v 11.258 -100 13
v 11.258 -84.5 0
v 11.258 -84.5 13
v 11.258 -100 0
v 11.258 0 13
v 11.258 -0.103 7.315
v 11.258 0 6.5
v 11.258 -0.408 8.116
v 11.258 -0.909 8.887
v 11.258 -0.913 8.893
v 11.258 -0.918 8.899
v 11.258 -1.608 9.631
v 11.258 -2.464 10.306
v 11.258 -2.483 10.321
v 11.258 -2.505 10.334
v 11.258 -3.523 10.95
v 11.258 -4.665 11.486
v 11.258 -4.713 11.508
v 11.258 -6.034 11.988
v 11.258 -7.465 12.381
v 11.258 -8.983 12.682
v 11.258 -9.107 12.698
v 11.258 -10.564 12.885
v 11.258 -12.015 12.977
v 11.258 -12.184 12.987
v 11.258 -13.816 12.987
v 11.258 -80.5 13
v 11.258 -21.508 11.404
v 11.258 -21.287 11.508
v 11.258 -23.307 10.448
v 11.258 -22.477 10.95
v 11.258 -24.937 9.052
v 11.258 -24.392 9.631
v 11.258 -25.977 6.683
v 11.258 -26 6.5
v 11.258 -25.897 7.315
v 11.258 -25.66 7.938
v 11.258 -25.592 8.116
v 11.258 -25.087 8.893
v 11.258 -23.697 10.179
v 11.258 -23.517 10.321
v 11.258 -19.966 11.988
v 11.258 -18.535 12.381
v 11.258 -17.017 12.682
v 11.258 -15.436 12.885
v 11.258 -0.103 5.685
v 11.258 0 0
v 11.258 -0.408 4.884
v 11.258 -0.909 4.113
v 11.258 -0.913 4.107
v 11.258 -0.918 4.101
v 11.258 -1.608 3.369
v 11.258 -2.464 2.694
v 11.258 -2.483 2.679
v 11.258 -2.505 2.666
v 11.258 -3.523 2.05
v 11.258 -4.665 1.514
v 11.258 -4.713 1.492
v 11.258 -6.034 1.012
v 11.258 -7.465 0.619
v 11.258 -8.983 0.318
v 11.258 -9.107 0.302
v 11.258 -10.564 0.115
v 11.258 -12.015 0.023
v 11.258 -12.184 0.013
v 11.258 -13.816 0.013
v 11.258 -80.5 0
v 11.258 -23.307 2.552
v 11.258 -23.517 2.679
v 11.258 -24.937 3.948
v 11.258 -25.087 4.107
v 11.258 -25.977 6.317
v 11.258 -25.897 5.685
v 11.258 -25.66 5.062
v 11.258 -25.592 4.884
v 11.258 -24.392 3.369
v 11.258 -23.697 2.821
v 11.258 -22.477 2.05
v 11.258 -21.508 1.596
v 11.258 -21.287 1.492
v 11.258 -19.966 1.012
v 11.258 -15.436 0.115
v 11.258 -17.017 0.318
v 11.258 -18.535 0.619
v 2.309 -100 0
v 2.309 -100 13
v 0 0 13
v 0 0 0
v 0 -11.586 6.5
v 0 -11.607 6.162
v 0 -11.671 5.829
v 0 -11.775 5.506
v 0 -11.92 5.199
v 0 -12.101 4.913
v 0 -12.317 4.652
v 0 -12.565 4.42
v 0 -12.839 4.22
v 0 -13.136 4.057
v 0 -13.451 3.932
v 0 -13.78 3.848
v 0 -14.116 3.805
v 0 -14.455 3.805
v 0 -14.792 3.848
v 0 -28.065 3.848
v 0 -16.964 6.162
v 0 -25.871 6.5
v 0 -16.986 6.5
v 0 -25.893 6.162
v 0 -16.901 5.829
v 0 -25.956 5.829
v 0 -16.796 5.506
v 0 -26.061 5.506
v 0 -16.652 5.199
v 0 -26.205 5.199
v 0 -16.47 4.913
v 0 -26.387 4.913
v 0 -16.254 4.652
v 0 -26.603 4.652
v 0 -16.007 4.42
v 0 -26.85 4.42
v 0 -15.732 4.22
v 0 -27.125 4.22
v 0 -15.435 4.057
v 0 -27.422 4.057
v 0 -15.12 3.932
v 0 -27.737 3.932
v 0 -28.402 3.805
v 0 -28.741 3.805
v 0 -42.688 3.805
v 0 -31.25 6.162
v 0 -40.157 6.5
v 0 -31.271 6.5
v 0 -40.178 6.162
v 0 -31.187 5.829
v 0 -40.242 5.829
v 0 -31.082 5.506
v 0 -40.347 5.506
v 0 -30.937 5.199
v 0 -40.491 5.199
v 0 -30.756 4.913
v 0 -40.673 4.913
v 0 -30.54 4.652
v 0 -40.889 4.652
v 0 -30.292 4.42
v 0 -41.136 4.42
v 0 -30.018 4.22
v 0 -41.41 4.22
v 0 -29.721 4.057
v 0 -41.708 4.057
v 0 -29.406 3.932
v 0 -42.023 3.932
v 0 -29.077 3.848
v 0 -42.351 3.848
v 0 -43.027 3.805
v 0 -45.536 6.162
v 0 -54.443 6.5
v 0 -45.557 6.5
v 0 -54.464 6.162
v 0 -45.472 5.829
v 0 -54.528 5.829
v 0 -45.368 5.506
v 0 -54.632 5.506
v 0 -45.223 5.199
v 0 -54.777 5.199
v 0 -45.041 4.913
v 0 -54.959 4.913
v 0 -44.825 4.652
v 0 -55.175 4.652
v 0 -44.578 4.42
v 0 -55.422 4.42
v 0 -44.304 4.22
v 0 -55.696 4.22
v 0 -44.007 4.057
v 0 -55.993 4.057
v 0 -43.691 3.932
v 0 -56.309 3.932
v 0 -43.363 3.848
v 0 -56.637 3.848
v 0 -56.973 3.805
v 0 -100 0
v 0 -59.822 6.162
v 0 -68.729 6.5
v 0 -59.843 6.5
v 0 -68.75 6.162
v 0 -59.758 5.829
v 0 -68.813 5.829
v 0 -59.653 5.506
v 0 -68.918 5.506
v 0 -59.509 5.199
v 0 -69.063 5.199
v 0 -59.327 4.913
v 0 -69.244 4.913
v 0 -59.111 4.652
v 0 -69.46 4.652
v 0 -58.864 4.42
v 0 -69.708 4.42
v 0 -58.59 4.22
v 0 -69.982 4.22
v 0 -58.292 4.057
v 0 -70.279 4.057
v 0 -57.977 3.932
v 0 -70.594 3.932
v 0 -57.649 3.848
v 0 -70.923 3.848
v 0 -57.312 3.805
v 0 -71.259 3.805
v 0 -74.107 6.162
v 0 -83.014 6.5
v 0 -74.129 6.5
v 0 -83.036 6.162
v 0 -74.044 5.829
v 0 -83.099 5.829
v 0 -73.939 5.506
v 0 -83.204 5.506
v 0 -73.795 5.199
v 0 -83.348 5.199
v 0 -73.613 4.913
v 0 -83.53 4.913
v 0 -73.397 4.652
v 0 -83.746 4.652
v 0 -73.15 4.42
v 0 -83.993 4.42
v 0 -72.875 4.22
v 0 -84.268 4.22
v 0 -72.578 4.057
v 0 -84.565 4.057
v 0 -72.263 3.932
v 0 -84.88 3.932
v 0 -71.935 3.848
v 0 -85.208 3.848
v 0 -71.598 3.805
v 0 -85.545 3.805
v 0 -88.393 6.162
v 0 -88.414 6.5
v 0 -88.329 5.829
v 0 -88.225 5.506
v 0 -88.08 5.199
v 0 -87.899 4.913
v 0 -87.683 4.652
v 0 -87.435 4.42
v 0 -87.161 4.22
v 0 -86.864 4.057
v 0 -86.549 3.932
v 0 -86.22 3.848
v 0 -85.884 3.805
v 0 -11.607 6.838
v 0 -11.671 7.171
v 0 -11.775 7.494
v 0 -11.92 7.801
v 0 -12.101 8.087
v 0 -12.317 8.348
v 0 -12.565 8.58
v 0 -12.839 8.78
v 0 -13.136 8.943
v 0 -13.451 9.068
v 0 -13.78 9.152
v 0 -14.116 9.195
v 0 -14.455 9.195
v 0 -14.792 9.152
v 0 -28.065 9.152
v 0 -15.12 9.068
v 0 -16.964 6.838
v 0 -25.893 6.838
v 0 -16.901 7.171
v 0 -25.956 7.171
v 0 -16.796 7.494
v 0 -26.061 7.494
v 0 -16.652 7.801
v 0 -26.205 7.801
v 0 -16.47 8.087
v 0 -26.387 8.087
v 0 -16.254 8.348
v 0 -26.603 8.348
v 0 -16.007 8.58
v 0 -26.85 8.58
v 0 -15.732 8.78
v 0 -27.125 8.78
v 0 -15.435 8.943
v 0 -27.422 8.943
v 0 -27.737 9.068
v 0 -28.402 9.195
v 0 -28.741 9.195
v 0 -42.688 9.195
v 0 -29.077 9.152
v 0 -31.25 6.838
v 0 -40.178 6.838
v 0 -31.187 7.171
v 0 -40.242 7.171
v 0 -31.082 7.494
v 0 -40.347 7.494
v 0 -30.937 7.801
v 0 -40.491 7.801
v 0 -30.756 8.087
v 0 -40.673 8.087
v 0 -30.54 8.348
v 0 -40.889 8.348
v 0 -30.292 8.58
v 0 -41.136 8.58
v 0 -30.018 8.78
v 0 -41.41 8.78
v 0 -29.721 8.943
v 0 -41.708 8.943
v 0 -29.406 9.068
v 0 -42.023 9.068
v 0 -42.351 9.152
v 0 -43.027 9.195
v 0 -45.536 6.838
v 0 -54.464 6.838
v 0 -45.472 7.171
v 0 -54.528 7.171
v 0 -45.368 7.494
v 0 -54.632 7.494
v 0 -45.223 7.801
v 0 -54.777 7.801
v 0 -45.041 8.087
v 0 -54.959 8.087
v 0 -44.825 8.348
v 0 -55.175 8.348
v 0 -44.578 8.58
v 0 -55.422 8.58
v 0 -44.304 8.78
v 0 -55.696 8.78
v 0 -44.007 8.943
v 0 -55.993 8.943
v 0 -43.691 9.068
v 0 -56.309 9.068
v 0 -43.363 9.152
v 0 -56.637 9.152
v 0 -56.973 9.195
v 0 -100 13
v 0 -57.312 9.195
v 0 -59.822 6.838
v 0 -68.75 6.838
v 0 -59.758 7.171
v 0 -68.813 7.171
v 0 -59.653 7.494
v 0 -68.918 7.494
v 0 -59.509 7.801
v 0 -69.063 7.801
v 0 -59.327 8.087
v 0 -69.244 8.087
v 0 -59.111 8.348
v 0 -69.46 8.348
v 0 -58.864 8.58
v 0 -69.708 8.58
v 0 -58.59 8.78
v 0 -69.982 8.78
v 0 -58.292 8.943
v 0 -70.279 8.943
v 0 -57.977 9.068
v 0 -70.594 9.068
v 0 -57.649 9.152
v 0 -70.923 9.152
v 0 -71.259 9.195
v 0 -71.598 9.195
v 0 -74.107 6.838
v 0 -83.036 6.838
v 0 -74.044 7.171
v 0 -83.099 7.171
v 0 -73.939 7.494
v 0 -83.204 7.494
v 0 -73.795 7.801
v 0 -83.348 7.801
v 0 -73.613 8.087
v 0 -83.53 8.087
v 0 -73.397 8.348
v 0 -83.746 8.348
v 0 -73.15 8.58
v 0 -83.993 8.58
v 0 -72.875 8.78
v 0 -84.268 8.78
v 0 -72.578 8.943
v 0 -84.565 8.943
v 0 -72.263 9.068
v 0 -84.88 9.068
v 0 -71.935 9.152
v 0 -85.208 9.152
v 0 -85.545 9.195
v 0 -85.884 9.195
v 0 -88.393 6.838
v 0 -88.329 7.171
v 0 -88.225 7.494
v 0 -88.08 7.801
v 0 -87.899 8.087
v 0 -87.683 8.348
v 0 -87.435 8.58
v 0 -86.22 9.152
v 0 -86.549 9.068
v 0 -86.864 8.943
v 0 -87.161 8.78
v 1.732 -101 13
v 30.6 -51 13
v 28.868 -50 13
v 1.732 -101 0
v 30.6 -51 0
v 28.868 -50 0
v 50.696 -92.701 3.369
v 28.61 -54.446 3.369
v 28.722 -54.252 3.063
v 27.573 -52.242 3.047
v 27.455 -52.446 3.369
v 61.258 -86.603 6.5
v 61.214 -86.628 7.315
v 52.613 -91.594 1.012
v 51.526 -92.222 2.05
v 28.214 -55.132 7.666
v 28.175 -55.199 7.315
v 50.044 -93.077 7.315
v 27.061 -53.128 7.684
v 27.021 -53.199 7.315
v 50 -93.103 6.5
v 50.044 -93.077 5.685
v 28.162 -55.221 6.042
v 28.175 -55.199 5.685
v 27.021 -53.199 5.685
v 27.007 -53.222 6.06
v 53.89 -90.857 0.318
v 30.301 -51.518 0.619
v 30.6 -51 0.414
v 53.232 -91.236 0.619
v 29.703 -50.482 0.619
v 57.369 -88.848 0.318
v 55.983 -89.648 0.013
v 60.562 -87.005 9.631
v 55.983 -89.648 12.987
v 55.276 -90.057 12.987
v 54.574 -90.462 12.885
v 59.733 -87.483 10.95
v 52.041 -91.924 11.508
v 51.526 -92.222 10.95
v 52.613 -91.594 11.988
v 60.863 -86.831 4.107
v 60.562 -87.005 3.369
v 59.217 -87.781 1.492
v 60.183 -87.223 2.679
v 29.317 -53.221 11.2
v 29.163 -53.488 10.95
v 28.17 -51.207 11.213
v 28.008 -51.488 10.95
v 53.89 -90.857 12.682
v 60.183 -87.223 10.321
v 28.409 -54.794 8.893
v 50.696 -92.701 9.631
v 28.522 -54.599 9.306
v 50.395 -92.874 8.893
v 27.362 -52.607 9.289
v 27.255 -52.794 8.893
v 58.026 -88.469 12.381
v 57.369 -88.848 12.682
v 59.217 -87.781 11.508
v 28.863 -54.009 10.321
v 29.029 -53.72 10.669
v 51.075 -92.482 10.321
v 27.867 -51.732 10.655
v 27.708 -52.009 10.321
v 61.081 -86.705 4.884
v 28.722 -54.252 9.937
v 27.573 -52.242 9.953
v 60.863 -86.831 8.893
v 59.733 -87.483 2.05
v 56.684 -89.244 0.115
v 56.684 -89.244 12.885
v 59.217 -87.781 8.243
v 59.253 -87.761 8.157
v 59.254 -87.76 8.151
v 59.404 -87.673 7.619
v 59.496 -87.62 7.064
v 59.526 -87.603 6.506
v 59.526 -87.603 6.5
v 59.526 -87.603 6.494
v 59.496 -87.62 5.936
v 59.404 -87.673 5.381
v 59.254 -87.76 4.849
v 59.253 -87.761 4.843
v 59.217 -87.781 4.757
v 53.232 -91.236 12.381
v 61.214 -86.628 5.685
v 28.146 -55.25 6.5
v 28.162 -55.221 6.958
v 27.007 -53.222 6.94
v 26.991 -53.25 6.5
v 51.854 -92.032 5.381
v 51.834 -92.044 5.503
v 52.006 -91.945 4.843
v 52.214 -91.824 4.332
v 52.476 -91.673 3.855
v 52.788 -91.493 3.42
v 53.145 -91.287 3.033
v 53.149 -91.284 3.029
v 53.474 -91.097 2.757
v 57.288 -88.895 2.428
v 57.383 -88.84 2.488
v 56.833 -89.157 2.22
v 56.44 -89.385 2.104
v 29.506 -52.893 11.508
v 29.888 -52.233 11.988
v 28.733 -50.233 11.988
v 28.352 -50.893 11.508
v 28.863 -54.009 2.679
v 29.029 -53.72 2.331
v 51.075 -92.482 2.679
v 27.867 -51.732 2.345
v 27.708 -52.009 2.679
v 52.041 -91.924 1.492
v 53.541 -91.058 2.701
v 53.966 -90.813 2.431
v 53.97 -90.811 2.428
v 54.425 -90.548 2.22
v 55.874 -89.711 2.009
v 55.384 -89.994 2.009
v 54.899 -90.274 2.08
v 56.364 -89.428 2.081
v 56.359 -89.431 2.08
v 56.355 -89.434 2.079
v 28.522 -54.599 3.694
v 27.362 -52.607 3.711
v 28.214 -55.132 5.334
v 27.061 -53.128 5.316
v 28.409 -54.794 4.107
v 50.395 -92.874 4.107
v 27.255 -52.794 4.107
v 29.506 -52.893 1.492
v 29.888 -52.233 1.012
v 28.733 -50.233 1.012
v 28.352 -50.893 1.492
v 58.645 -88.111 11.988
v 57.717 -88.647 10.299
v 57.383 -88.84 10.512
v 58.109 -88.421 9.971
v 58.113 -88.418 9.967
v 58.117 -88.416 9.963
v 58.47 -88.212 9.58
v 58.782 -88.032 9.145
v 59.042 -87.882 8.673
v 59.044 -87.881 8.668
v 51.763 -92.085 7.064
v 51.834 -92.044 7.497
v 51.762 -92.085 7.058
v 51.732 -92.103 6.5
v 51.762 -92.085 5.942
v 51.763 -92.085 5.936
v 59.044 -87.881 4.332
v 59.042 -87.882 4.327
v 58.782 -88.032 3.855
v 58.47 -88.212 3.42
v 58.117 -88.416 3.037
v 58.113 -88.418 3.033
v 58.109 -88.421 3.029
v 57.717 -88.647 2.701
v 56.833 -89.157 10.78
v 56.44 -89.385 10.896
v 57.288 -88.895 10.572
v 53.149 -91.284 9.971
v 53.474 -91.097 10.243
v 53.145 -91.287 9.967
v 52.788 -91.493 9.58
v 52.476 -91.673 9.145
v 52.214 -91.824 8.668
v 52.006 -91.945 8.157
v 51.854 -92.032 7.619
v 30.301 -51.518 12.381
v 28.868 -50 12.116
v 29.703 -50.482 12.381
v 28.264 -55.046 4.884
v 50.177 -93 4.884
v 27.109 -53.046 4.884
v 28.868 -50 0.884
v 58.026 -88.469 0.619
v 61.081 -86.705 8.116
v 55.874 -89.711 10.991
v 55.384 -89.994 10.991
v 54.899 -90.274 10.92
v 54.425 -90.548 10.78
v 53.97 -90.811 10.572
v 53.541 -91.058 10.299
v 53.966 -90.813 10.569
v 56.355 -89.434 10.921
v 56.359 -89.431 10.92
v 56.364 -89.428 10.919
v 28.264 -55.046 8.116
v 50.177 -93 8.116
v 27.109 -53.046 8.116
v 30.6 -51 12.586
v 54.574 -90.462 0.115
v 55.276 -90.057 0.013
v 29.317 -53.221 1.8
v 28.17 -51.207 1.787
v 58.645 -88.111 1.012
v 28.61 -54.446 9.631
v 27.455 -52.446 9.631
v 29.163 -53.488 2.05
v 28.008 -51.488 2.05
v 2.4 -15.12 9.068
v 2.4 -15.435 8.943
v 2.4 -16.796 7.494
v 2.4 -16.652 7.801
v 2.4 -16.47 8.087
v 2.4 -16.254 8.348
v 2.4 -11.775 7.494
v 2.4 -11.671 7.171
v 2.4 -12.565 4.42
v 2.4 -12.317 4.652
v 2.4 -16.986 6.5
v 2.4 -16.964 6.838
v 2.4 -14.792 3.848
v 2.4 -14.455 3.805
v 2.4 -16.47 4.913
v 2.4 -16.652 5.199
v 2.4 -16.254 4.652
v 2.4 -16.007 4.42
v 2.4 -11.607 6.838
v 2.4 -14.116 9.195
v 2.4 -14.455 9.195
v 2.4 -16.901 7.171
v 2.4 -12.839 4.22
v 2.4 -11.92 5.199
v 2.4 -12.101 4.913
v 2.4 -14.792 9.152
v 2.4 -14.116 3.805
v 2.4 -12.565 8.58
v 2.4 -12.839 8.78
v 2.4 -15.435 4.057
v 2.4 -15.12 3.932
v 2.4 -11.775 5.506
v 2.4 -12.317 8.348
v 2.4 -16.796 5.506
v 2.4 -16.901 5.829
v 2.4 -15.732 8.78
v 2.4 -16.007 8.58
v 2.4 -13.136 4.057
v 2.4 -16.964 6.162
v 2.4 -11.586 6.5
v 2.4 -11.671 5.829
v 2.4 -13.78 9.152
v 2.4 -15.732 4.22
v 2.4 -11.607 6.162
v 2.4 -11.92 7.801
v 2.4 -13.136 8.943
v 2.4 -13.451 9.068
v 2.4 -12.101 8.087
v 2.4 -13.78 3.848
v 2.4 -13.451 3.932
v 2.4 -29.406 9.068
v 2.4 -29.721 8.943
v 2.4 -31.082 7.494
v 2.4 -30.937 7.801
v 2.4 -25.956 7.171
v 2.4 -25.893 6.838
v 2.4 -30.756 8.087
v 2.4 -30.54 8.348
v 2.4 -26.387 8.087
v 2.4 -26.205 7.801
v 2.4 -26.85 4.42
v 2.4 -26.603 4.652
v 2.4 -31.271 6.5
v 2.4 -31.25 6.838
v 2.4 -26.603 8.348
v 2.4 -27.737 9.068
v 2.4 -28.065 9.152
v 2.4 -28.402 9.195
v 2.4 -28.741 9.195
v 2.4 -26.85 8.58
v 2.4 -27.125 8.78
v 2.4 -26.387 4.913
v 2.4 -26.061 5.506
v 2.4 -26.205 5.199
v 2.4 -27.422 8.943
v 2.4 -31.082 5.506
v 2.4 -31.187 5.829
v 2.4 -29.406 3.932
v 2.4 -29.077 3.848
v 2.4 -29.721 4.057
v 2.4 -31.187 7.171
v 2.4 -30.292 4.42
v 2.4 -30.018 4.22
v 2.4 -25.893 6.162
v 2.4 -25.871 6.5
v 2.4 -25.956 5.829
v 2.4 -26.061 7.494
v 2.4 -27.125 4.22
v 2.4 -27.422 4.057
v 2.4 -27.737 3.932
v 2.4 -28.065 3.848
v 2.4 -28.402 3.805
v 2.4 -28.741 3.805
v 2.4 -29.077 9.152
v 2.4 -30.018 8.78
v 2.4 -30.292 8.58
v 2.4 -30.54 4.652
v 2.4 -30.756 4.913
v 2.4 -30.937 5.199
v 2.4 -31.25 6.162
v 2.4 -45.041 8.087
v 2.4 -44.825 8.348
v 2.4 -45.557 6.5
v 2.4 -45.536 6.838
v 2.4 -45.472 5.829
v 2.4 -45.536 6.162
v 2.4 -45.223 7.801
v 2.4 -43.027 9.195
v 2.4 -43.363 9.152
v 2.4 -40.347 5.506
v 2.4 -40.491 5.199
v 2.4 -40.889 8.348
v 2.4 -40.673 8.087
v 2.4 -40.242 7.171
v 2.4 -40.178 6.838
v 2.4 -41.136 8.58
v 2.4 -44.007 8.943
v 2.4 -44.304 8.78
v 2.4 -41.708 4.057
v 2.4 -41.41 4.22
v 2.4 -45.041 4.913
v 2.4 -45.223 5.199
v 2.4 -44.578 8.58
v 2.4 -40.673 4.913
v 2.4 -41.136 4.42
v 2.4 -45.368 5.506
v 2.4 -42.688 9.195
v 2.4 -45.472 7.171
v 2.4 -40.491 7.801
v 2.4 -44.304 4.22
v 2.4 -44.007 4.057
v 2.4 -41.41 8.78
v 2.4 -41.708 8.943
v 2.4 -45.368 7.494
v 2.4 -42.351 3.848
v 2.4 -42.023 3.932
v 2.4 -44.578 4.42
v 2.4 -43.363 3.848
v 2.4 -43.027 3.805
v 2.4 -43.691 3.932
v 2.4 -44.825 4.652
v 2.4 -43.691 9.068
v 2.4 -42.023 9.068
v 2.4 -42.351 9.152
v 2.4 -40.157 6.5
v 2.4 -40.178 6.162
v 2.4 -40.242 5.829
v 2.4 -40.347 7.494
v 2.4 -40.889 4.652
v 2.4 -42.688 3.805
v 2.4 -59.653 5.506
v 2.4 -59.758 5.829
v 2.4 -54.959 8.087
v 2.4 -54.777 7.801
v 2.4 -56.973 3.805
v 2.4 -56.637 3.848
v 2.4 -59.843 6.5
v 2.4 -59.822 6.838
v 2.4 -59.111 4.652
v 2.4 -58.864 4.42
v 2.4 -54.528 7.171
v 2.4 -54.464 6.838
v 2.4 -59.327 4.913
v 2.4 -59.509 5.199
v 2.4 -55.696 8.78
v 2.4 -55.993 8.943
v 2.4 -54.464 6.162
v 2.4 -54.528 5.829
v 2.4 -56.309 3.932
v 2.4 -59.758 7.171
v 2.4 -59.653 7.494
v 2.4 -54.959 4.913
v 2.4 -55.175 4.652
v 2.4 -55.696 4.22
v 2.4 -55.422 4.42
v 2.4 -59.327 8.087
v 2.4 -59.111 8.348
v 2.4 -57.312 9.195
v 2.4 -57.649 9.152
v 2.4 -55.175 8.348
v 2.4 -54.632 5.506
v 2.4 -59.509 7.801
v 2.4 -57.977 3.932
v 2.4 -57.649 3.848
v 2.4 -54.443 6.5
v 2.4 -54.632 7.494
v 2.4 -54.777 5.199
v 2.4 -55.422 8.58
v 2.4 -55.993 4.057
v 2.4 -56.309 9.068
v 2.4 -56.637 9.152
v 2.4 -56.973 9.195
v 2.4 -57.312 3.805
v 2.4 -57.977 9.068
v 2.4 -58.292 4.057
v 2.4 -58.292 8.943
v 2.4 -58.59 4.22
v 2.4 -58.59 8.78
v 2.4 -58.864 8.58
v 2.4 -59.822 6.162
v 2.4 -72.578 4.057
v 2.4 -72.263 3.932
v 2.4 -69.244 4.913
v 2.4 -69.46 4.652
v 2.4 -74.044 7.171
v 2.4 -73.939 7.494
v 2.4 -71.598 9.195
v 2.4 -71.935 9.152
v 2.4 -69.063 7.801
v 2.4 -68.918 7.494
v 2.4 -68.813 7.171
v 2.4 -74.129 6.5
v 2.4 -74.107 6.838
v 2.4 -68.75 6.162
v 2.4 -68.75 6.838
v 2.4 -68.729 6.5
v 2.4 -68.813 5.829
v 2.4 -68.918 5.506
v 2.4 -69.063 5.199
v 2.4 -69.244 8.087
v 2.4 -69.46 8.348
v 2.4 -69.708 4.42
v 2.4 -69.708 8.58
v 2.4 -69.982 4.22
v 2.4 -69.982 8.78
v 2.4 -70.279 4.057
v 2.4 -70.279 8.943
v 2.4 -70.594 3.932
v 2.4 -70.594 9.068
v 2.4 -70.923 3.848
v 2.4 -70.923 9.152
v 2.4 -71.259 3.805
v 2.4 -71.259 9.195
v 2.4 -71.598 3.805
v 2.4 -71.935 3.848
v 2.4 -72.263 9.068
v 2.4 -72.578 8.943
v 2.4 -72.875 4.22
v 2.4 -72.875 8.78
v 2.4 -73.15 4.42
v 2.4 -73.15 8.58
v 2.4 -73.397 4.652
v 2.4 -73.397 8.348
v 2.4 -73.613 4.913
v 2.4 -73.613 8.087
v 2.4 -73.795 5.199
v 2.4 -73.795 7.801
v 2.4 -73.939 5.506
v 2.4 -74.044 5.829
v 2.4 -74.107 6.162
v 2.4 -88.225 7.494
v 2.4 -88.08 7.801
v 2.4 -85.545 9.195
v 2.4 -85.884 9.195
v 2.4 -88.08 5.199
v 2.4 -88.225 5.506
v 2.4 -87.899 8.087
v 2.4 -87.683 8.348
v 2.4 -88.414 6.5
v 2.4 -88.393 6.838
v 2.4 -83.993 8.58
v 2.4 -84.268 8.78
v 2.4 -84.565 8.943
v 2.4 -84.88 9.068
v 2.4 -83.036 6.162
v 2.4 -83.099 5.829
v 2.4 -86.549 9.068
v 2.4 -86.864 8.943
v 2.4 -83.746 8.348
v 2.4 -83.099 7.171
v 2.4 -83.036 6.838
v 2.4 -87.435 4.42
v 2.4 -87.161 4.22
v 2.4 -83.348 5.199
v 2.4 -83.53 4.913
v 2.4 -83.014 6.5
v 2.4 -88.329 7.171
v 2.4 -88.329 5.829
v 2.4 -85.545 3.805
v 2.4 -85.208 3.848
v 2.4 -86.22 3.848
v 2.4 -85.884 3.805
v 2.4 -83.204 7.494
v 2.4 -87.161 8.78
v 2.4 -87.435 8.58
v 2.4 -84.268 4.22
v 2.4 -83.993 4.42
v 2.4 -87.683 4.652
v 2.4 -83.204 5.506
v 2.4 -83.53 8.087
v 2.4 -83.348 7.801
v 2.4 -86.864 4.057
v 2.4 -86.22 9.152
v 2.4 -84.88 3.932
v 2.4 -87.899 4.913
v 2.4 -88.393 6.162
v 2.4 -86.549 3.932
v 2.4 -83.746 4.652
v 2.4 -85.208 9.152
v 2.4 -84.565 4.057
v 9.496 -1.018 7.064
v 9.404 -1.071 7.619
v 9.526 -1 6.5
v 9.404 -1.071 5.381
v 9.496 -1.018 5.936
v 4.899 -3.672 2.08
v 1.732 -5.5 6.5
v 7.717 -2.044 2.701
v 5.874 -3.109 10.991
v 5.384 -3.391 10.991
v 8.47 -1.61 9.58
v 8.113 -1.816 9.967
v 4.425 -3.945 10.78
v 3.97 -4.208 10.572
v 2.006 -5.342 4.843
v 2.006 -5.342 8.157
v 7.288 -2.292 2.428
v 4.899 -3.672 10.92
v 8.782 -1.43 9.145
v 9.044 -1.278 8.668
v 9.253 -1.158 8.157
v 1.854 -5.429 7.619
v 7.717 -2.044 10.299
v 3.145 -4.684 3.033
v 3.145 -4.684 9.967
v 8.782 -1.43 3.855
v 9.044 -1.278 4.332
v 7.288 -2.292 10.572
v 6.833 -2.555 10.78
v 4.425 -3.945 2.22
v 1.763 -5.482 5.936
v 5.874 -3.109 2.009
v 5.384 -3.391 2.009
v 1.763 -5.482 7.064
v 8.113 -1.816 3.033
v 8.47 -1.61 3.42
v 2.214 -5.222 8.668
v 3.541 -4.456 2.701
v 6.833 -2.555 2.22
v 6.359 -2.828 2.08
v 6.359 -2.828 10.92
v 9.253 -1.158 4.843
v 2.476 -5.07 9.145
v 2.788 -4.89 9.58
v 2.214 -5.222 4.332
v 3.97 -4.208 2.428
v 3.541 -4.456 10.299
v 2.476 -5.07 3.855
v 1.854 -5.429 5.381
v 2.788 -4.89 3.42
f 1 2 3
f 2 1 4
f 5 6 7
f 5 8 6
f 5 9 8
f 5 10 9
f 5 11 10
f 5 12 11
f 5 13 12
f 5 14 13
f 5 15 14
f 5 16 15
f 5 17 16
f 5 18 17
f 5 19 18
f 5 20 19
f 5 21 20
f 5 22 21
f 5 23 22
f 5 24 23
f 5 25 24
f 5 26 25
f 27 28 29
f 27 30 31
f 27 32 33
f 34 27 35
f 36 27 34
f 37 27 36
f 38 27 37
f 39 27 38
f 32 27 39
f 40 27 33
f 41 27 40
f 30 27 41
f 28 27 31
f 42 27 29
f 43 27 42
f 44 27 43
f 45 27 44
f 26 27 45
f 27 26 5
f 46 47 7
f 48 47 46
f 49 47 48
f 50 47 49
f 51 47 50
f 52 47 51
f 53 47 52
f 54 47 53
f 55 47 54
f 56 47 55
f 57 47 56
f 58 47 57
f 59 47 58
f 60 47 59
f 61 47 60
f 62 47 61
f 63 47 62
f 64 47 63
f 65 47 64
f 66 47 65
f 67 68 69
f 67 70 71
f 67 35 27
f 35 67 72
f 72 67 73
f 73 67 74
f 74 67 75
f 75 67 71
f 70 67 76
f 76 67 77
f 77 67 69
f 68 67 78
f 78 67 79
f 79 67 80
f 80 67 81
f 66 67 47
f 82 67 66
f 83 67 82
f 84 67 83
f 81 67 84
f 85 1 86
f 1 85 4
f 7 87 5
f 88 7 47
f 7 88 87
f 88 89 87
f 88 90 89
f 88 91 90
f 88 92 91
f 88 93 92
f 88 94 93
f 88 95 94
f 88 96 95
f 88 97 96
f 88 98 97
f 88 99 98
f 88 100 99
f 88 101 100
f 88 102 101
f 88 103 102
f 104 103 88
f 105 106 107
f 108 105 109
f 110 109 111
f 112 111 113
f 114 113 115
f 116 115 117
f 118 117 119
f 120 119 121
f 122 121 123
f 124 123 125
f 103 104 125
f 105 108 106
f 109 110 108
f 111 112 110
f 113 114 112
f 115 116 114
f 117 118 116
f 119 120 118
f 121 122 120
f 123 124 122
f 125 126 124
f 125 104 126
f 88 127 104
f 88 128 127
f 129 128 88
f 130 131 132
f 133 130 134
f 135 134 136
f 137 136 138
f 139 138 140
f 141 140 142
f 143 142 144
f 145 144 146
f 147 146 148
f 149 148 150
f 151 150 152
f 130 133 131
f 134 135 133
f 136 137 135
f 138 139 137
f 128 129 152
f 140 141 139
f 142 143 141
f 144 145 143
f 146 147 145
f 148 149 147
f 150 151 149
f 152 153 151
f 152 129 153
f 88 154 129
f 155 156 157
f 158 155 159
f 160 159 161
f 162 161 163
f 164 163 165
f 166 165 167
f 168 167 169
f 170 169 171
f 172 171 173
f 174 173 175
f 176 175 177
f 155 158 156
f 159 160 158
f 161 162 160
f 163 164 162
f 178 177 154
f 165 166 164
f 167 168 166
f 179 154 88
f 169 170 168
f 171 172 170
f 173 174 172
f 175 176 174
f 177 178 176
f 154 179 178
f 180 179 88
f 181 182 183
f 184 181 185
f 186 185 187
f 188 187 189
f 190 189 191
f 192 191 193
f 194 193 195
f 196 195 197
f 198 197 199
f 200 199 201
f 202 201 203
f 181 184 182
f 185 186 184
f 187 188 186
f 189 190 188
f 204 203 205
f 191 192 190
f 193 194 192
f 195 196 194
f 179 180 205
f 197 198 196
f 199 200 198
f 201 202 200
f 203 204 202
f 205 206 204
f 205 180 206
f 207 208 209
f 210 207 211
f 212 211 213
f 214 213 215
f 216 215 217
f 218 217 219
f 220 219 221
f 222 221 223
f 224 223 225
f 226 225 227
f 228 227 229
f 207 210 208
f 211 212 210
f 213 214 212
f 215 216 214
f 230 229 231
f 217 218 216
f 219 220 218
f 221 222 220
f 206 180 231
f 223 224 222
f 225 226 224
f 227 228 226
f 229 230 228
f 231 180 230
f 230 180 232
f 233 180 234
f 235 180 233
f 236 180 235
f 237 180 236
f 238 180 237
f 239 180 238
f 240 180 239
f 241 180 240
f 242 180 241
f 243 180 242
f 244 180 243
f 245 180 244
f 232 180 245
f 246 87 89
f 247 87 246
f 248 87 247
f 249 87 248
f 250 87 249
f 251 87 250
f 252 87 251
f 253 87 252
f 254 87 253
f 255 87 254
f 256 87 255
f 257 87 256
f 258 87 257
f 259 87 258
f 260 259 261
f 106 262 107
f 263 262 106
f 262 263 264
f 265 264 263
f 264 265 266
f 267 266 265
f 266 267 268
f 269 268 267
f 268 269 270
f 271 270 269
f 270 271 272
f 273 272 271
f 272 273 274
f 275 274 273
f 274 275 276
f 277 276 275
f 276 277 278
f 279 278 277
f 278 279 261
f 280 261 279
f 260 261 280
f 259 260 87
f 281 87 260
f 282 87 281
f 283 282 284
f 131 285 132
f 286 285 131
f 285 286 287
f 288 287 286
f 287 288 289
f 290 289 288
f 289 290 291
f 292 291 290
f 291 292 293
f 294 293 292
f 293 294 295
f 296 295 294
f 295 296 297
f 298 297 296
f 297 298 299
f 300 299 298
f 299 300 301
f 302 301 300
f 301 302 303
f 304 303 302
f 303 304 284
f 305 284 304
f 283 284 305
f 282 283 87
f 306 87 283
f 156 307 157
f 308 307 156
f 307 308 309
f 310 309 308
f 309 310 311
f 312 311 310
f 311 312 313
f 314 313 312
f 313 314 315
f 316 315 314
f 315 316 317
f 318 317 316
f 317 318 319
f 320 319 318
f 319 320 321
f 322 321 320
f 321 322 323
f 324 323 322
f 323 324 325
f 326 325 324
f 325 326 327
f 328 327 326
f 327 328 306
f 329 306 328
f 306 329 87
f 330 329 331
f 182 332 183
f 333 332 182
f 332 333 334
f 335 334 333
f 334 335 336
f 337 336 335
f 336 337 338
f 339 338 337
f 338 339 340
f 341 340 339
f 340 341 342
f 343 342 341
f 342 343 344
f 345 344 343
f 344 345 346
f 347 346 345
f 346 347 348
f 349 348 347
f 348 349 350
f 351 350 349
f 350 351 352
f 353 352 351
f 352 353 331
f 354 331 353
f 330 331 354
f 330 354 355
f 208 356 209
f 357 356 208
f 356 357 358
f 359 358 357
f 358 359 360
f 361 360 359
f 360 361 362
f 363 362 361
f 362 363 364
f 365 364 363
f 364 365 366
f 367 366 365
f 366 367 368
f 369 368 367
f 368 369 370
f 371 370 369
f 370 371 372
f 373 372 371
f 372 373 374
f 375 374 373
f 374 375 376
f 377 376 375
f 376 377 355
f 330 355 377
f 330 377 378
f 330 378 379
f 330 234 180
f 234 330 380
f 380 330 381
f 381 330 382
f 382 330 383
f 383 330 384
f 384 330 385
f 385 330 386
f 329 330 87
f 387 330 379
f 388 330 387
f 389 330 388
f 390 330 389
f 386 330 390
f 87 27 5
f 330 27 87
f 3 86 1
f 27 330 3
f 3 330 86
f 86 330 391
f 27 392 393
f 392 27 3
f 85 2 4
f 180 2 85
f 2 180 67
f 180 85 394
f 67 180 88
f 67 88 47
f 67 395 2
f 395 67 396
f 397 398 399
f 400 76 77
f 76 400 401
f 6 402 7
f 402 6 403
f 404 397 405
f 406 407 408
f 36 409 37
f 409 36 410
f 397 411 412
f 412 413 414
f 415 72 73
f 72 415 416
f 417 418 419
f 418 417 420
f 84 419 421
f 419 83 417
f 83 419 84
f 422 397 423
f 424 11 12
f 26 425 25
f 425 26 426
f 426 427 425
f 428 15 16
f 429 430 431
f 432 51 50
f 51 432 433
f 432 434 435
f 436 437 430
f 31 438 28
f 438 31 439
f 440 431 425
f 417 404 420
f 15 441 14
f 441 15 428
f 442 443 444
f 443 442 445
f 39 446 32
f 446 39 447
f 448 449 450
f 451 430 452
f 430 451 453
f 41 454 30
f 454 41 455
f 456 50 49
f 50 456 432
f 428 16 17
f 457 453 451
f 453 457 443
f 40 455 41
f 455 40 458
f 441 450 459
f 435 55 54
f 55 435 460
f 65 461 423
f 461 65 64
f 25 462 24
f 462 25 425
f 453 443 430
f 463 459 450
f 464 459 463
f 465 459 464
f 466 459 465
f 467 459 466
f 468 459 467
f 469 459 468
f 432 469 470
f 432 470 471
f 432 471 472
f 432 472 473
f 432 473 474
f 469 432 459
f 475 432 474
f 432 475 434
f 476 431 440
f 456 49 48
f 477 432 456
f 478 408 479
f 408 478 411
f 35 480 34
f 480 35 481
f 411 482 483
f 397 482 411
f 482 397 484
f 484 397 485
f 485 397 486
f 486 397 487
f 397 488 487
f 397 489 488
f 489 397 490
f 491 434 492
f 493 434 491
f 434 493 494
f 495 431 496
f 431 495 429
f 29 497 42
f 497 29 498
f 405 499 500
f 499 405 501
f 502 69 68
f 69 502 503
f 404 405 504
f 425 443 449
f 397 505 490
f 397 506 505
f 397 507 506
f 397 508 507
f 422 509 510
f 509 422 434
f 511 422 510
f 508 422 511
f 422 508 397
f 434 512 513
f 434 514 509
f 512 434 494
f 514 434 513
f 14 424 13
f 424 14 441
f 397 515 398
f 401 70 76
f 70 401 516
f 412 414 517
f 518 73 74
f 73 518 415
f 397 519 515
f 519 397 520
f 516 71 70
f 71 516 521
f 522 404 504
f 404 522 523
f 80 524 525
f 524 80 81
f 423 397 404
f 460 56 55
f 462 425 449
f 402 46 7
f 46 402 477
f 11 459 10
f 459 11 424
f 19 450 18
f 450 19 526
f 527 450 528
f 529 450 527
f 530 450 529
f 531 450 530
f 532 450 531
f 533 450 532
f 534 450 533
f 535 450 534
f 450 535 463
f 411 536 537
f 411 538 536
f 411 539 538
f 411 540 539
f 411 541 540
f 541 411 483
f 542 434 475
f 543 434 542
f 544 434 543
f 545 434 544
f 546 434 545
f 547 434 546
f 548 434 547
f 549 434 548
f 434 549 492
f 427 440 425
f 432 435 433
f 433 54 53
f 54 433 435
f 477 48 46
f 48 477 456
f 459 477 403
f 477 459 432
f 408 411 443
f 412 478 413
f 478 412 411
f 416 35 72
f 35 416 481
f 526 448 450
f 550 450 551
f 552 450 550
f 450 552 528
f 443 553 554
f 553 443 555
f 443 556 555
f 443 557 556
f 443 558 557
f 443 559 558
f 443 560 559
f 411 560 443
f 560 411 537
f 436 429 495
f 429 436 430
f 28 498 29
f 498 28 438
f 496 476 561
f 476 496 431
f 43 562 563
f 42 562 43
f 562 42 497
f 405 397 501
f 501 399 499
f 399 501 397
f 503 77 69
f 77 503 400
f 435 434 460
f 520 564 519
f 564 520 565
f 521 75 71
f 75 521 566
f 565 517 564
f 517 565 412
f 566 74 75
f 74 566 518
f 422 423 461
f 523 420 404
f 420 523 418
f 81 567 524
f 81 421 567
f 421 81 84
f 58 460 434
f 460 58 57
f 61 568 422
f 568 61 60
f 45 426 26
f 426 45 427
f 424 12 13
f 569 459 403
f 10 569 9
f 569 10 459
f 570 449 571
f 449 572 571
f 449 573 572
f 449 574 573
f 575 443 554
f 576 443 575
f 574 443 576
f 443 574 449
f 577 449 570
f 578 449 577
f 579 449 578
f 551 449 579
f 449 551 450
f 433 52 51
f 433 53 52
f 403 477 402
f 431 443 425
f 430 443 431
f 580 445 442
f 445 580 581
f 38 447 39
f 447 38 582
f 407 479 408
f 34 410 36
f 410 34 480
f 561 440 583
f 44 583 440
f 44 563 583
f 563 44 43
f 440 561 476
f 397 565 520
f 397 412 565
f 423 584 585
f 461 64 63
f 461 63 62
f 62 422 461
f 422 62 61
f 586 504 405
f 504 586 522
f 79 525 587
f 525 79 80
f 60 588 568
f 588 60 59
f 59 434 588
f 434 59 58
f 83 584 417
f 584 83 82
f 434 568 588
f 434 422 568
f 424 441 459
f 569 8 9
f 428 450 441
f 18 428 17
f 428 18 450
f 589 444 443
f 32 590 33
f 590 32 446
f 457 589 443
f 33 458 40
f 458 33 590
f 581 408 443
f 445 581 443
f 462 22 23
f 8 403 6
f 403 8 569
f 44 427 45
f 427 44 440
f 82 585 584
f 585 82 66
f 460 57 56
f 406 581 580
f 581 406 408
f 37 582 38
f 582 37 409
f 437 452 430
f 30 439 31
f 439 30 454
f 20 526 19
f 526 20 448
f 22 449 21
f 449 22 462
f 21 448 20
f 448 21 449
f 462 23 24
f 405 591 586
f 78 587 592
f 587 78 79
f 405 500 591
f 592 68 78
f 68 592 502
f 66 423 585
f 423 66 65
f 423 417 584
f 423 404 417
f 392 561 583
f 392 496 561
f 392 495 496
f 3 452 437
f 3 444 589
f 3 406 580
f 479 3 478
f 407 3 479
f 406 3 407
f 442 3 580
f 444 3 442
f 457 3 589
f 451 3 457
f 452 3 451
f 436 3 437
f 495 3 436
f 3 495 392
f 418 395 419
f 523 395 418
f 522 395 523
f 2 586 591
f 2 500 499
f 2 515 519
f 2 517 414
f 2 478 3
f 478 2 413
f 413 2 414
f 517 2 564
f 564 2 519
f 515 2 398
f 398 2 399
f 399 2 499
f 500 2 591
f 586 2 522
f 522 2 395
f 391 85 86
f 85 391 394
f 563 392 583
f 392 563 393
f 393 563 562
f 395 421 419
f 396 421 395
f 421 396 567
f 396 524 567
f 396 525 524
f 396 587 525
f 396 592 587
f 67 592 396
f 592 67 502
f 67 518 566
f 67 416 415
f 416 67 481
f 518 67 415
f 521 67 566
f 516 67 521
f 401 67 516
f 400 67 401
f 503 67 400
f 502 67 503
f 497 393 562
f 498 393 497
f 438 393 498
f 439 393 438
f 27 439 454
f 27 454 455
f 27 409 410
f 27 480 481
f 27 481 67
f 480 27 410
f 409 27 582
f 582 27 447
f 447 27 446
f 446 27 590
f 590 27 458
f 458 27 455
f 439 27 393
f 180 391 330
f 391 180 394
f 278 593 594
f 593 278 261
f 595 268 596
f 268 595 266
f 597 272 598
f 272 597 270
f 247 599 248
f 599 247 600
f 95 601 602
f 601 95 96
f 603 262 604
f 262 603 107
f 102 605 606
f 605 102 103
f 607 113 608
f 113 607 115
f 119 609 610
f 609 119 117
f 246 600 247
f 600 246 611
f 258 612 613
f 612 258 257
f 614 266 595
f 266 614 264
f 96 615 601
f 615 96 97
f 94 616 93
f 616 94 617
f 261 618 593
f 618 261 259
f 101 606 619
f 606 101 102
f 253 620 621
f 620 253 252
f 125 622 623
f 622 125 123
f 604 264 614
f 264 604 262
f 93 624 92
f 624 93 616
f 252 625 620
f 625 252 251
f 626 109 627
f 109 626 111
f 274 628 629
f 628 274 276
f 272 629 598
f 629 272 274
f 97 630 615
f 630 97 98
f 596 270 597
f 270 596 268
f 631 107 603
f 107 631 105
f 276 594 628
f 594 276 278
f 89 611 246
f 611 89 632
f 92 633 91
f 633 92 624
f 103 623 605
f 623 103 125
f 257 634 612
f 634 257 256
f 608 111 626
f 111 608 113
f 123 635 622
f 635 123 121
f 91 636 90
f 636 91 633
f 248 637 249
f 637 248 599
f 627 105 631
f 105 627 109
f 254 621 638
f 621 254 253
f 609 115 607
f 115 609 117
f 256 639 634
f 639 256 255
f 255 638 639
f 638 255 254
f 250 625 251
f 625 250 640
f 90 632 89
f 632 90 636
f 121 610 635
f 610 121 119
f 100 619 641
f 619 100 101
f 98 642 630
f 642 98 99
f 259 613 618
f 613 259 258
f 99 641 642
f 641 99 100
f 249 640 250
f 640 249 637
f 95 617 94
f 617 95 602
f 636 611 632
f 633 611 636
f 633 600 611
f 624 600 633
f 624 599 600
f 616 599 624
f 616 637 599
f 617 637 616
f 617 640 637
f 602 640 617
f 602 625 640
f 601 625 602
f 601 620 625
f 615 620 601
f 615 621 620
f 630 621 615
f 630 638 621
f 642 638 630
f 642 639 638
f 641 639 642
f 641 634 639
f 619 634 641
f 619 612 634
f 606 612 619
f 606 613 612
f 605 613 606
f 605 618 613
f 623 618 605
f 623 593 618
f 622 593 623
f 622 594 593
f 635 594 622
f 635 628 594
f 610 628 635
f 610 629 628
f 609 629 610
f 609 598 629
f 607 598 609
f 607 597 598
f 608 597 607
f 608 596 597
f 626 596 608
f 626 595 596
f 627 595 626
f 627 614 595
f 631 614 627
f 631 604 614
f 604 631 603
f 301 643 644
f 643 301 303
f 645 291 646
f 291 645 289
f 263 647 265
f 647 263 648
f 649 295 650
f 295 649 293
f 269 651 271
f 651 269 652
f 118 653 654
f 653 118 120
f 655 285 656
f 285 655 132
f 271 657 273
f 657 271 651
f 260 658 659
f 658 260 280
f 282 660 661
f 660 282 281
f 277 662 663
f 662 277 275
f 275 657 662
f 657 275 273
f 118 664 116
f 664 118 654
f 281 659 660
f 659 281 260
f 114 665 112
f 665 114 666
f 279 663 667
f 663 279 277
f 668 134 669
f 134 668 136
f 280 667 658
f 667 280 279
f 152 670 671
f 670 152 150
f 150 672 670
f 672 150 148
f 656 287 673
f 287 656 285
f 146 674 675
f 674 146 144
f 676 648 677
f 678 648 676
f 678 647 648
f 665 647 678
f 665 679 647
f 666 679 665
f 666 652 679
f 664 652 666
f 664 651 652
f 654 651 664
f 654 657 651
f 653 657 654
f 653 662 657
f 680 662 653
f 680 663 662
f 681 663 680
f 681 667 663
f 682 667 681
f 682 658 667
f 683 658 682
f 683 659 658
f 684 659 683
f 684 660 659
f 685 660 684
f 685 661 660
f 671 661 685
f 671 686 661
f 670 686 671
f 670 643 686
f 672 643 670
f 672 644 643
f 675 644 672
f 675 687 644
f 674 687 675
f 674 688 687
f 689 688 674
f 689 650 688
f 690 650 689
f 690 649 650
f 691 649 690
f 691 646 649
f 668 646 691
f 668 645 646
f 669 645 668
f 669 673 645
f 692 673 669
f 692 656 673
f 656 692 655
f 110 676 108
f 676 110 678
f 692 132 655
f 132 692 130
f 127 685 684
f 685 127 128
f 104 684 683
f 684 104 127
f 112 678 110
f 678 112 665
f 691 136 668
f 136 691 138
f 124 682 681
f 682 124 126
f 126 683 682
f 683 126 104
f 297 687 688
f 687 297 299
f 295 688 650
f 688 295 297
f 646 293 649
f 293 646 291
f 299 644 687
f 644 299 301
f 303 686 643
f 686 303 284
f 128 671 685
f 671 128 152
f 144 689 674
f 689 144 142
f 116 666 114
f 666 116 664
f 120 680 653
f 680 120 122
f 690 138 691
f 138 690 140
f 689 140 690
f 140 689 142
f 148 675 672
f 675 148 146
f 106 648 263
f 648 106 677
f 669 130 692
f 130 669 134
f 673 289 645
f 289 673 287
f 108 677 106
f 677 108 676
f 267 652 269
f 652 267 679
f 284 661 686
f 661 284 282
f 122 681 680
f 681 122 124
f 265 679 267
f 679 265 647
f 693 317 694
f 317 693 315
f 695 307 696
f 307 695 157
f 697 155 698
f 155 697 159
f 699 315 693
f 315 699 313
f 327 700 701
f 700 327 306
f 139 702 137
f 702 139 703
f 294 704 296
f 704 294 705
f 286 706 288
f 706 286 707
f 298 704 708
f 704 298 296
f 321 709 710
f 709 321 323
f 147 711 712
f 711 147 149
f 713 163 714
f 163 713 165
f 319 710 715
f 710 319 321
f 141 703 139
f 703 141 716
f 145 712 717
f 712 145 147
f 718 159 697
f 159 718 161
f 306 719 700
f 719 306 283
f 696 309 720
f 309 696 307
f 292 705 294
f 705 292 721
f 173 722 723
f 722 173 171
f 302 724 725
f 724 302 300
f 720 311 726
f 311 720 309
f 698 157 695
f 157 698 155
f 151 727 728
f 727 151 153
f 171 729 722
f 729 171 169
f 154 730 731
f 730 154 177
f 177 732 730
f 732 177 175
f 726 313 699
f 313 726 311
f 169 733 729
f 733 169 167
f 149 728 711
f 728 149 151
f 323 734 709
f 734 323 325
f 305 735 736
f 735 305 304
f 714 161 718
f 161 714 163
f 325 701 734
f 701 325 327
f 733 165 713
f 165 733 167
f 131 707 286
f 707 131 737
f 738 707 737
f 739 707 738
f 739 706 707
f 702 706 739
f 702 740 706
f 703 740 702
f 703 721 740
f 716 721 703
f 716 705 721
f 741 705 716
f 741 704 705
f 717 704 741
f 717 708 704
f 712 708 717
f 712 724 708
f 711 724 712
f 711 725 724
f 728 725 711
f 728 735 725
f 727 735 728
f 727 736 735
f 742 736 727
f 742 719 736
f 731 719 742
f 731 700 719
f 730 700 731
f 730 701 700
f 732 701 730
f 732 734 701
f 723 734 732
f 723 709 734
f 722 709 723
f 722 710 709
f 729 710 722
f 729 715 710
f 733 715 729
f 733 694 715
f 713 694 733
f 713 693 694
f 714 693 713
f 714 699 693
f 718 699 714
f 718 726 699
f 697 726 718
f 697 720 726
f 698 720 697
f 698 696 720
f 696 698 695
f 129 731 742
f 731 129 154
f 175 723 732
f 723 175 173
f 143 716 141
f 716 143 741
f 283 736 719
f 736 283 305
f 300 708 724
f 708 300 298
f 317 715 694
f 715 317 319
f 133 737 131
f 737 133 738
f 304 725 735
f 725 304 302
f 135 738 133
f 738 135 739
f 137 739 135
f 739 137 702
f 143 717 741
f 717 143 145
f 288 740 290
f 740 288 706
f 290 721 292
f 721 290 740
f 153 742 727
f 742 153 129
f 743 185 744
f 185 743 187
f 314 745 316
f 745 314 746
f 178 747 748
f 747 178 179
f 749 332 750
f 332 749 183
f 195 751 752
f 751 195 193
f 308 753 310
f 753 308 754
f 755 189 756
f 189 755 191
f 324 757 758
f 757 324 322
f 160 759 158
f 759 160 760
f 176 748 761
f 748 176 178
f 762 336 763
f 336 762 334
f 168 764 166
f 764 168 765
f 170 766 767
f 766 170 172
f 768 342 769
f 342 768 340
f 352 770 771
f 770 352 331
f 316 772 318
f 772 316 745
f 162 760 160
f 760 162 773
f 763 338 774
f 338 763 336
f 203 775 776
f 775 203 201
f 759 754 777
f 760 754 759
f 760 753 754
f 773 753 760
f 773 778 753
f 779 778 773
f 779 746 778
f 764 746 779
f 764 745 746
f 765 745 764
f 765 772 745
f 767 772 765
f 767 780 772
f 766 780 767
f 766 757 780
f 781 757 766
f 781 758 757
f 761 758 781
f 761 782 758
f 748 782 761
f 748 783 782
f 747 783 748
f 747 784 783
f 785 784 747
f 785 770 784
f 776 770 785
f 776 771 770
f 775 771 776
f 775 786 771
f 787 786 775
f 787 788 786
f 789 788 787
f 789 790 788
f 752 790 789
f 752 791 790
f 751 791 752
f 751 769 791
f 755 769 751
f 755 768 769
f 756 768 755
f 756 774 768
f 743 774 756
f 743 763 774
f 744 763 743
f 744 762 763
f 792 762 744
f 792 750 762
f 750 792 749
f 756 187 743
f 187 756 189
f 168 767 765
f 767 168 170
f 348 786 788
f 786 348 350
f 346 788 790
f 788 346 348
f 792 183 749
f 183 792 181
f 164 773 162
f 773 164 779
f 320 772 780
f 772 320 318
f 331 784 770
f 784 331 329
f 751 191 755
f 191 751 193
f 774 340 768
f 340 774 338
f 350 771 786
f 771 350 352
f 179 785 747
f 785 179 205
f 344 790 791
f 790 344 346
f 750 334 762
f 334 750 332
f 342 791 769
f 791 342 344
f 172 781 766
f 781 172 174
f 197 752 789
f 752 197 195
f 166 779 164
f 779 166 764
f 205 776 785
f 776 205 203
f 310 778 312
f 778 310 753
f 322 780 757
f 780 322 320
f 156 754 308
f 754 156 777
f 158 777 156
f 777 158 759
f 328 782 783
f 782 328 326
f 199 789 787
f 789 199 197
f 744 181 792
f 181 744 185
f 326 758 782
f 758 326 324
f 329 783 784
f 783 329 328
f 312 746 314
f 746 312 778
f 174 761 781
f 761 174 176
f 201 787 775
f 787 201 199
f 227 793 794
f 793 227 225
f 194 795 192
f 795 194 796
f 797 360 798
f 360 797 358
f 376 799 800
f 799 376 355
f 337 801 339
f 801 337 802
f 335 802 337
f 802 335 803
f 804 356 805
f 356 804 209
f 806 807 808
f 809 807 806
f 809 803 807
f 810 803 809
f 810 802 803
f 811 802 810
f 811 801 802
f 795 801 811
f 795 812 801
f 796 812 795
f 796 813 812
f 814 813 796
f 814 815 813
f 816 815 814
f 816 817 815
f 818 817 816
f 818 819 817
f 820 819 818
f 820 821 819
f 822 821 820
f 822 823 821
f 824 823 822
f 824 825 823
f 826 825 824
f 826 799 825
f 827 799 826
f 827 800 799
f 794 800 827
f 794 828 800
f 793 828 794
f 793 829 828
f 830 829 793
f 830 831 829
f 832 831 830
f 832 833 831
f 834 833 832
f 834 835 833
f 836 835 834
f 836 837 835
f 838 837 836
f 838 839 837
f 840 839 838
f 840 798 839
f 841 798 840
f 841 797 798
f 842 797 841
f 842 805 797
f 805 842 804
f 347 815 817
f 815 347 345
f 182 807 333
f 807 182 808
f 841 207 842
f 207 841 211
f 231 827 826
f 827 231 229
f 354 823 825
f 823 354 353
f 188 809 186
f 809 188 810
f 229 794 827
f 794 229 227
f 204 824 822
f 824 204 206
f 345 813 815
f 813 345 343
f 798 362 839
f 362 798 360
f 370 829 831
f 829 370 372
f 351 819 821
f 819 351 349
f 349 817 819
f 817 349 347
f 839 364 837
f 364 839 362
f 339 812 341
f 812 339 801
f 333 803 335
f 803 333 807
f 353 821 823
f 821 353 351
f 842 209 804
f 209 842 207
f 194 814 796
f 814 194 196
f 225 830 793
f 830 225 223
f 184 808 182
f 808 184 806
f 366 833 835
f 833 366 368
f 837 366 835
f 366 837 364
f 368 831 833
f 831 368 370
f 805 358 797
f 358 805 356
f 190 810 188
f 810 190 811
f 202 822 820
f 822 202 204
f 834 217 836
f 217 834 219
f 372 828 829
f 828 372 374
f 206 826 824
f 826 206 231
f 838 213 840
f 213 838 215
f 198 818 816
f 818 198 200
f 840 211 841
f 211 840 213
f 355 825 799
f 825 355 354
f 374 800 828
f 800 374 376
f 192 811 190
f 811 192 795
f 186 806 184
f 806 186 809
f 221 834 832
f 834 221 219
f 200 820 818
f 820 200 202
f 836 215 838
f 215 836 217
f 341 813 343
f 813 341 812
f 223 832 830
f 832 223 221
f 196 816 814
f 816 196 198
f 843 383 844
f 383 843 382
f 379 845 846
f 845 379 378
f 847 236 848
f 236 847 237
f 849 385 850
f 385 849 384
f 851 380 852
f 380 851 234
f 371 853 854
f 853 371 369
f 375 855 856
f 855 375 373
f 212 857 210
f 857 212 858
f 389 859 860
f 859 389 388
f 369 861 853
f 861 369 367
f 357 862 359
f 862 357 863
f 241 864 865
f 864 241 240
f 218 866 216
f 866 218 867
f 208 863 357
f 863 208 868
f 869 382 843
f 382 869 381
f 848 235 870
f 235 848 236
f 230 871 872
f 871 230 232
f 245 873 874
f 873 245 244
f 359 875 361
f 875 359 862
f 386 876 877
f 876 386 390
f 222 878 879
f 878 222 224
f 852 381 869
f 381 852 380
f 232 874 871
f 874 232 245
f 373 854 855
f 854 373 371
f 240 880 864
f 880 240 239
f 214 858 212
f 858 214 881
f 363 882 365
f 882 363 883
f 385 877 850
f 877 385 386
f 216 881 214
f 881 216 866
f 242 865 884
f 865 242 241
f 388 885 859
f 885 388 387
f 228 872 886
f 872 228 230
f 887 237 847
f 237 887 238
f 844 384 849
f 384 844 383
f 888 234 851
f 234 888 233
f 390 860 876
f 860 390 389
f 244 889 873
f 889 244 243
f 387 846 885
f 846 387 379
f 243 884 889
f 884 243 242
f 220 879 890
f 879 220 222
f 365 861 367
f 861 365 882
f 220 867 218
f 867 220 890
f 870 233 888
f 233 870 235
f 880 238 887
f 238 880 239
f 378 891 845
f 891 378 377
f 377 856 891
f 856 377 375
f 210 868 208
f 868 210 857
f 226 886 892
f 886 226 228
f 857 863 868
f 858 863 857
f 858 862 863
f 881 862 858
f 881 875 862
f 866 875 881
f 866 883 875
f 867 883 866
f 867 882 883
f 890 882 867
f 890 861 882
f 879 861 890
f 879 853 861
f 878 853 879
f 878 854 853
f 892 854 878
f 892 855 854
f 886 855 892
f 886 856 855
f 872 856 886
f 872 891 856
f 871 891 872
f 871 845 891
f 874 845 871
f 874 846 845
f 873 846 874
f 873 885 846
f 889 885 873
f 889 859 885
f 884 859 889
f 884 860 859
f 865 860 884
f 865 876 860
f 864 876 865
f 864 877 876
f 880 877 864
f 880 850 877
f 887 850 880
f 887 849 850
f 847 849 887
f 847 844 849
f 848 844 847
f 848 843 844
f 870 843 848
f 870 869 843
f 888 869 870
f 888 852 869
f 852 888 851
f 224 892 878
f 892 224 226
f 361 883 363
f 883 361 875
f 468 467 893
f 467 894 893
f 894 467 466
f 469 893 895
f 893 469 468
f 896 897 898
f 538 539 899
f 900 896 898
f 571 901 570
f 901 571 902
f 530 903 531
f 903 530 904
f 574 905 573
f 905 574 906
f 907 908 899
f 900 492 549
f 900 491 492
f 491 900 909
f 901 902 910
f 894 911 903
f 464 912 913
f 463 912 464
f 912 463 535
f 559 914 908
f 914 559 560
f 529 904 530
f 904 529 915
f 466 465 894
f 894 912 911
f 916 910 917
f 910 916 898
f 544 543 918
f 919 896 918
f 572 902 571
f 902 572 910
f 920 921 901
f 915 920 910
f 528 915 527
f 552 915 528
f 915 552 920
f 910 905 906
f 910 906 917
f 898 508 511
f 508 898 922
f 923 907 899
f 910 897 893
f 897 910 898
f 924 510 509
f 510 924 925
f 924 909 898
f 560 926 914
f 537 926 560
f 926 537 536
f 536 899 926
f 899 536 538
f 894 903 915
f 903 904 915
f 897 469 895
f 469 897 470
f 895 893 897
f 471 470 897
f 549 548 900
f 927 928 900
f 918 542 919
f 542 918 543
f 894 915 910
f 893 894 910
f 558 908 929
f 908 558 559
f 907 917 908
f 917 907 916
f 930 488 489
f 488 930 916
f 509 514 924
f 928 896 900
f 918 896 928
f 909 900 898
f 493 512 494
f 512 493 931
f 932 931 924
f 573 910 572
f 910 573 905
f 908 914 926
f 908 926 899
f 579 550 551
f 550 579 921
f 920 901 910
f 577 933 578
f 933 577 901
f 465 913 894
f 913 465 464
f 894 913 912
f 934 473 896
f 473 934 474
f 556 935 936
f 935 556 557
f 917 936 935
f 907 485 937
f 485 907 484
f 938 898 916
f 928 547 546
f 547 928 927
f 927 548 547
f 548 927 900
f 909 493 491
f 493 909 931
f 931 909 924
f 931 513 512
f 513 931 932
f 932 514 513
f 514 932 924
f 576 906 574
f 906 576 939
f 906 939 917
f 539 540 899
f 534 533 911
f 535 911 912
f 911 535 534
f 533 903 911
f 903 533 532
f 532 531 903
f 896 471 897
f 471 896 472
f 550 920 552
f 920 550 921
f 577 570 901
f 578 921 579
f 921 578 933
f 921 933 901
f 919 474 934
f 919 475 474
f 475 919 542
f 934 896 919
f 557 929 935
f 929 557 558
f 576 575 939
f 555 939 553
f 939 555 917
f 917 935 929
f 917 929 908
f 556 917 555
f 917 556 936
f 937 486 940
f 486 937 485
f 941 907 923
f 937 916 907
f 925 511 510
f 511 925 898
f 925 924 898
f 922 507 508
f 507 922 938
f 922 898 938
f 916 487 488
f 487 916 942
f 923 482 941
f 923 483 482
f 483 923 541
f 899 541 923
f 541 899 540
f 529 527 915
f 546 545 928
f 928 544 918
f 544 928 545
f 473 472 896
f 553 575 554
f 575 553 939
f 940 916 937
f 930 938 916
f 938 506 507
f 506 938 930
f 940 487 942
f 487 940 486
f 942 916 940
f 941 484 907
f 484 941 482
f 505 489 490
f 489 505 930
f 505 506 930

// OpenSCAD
angle=30;
poleR = 4.5;
h1=100;
numberOfMagnets = 6;
magnetR = 2.7;
magnetThick = 2.4;

rotate([90,0,0]) {
    difference() {
        union() {
            cube([(poleR+2)*2*cos(angle),(poleR+2)*2+0,h1]);
            translate([(poleR+2)*cos(angle),poleR+2+0/2,(poleR+2)*sin(angle)]) {
                rotate([0,angle,0]) {
                    cylinder(r=poleR+2, h=h1, $fn=50);
                }
            }
            translate([0,0,h1]) {
                rotate([0,60,0]) {
                    cube([h1/sin(180-30-angle)*sin(angle),(poleR+2)*2+0,2]);
                }
            }
        }
        translate([(poleR+2)*cos(angle),poleR+2+0/2,(poleR+2)*sin(angle)]) {
            rotate([0,angle,0]) {
                cylinder(r=poleR, h=h1+1, $fn=50);
            }
        }
        for (i=[1:1:numberOfMagnets]) {
            translate([magnetThick, poleR+2+0/2, h1*i/(numberOfMagnets+1)]) {
                rotate([0,-90,0]) {
                    cylinder(r=magnetR, h=magnetThick+1, $fn=50);
                }
            }
        }
    }
}
